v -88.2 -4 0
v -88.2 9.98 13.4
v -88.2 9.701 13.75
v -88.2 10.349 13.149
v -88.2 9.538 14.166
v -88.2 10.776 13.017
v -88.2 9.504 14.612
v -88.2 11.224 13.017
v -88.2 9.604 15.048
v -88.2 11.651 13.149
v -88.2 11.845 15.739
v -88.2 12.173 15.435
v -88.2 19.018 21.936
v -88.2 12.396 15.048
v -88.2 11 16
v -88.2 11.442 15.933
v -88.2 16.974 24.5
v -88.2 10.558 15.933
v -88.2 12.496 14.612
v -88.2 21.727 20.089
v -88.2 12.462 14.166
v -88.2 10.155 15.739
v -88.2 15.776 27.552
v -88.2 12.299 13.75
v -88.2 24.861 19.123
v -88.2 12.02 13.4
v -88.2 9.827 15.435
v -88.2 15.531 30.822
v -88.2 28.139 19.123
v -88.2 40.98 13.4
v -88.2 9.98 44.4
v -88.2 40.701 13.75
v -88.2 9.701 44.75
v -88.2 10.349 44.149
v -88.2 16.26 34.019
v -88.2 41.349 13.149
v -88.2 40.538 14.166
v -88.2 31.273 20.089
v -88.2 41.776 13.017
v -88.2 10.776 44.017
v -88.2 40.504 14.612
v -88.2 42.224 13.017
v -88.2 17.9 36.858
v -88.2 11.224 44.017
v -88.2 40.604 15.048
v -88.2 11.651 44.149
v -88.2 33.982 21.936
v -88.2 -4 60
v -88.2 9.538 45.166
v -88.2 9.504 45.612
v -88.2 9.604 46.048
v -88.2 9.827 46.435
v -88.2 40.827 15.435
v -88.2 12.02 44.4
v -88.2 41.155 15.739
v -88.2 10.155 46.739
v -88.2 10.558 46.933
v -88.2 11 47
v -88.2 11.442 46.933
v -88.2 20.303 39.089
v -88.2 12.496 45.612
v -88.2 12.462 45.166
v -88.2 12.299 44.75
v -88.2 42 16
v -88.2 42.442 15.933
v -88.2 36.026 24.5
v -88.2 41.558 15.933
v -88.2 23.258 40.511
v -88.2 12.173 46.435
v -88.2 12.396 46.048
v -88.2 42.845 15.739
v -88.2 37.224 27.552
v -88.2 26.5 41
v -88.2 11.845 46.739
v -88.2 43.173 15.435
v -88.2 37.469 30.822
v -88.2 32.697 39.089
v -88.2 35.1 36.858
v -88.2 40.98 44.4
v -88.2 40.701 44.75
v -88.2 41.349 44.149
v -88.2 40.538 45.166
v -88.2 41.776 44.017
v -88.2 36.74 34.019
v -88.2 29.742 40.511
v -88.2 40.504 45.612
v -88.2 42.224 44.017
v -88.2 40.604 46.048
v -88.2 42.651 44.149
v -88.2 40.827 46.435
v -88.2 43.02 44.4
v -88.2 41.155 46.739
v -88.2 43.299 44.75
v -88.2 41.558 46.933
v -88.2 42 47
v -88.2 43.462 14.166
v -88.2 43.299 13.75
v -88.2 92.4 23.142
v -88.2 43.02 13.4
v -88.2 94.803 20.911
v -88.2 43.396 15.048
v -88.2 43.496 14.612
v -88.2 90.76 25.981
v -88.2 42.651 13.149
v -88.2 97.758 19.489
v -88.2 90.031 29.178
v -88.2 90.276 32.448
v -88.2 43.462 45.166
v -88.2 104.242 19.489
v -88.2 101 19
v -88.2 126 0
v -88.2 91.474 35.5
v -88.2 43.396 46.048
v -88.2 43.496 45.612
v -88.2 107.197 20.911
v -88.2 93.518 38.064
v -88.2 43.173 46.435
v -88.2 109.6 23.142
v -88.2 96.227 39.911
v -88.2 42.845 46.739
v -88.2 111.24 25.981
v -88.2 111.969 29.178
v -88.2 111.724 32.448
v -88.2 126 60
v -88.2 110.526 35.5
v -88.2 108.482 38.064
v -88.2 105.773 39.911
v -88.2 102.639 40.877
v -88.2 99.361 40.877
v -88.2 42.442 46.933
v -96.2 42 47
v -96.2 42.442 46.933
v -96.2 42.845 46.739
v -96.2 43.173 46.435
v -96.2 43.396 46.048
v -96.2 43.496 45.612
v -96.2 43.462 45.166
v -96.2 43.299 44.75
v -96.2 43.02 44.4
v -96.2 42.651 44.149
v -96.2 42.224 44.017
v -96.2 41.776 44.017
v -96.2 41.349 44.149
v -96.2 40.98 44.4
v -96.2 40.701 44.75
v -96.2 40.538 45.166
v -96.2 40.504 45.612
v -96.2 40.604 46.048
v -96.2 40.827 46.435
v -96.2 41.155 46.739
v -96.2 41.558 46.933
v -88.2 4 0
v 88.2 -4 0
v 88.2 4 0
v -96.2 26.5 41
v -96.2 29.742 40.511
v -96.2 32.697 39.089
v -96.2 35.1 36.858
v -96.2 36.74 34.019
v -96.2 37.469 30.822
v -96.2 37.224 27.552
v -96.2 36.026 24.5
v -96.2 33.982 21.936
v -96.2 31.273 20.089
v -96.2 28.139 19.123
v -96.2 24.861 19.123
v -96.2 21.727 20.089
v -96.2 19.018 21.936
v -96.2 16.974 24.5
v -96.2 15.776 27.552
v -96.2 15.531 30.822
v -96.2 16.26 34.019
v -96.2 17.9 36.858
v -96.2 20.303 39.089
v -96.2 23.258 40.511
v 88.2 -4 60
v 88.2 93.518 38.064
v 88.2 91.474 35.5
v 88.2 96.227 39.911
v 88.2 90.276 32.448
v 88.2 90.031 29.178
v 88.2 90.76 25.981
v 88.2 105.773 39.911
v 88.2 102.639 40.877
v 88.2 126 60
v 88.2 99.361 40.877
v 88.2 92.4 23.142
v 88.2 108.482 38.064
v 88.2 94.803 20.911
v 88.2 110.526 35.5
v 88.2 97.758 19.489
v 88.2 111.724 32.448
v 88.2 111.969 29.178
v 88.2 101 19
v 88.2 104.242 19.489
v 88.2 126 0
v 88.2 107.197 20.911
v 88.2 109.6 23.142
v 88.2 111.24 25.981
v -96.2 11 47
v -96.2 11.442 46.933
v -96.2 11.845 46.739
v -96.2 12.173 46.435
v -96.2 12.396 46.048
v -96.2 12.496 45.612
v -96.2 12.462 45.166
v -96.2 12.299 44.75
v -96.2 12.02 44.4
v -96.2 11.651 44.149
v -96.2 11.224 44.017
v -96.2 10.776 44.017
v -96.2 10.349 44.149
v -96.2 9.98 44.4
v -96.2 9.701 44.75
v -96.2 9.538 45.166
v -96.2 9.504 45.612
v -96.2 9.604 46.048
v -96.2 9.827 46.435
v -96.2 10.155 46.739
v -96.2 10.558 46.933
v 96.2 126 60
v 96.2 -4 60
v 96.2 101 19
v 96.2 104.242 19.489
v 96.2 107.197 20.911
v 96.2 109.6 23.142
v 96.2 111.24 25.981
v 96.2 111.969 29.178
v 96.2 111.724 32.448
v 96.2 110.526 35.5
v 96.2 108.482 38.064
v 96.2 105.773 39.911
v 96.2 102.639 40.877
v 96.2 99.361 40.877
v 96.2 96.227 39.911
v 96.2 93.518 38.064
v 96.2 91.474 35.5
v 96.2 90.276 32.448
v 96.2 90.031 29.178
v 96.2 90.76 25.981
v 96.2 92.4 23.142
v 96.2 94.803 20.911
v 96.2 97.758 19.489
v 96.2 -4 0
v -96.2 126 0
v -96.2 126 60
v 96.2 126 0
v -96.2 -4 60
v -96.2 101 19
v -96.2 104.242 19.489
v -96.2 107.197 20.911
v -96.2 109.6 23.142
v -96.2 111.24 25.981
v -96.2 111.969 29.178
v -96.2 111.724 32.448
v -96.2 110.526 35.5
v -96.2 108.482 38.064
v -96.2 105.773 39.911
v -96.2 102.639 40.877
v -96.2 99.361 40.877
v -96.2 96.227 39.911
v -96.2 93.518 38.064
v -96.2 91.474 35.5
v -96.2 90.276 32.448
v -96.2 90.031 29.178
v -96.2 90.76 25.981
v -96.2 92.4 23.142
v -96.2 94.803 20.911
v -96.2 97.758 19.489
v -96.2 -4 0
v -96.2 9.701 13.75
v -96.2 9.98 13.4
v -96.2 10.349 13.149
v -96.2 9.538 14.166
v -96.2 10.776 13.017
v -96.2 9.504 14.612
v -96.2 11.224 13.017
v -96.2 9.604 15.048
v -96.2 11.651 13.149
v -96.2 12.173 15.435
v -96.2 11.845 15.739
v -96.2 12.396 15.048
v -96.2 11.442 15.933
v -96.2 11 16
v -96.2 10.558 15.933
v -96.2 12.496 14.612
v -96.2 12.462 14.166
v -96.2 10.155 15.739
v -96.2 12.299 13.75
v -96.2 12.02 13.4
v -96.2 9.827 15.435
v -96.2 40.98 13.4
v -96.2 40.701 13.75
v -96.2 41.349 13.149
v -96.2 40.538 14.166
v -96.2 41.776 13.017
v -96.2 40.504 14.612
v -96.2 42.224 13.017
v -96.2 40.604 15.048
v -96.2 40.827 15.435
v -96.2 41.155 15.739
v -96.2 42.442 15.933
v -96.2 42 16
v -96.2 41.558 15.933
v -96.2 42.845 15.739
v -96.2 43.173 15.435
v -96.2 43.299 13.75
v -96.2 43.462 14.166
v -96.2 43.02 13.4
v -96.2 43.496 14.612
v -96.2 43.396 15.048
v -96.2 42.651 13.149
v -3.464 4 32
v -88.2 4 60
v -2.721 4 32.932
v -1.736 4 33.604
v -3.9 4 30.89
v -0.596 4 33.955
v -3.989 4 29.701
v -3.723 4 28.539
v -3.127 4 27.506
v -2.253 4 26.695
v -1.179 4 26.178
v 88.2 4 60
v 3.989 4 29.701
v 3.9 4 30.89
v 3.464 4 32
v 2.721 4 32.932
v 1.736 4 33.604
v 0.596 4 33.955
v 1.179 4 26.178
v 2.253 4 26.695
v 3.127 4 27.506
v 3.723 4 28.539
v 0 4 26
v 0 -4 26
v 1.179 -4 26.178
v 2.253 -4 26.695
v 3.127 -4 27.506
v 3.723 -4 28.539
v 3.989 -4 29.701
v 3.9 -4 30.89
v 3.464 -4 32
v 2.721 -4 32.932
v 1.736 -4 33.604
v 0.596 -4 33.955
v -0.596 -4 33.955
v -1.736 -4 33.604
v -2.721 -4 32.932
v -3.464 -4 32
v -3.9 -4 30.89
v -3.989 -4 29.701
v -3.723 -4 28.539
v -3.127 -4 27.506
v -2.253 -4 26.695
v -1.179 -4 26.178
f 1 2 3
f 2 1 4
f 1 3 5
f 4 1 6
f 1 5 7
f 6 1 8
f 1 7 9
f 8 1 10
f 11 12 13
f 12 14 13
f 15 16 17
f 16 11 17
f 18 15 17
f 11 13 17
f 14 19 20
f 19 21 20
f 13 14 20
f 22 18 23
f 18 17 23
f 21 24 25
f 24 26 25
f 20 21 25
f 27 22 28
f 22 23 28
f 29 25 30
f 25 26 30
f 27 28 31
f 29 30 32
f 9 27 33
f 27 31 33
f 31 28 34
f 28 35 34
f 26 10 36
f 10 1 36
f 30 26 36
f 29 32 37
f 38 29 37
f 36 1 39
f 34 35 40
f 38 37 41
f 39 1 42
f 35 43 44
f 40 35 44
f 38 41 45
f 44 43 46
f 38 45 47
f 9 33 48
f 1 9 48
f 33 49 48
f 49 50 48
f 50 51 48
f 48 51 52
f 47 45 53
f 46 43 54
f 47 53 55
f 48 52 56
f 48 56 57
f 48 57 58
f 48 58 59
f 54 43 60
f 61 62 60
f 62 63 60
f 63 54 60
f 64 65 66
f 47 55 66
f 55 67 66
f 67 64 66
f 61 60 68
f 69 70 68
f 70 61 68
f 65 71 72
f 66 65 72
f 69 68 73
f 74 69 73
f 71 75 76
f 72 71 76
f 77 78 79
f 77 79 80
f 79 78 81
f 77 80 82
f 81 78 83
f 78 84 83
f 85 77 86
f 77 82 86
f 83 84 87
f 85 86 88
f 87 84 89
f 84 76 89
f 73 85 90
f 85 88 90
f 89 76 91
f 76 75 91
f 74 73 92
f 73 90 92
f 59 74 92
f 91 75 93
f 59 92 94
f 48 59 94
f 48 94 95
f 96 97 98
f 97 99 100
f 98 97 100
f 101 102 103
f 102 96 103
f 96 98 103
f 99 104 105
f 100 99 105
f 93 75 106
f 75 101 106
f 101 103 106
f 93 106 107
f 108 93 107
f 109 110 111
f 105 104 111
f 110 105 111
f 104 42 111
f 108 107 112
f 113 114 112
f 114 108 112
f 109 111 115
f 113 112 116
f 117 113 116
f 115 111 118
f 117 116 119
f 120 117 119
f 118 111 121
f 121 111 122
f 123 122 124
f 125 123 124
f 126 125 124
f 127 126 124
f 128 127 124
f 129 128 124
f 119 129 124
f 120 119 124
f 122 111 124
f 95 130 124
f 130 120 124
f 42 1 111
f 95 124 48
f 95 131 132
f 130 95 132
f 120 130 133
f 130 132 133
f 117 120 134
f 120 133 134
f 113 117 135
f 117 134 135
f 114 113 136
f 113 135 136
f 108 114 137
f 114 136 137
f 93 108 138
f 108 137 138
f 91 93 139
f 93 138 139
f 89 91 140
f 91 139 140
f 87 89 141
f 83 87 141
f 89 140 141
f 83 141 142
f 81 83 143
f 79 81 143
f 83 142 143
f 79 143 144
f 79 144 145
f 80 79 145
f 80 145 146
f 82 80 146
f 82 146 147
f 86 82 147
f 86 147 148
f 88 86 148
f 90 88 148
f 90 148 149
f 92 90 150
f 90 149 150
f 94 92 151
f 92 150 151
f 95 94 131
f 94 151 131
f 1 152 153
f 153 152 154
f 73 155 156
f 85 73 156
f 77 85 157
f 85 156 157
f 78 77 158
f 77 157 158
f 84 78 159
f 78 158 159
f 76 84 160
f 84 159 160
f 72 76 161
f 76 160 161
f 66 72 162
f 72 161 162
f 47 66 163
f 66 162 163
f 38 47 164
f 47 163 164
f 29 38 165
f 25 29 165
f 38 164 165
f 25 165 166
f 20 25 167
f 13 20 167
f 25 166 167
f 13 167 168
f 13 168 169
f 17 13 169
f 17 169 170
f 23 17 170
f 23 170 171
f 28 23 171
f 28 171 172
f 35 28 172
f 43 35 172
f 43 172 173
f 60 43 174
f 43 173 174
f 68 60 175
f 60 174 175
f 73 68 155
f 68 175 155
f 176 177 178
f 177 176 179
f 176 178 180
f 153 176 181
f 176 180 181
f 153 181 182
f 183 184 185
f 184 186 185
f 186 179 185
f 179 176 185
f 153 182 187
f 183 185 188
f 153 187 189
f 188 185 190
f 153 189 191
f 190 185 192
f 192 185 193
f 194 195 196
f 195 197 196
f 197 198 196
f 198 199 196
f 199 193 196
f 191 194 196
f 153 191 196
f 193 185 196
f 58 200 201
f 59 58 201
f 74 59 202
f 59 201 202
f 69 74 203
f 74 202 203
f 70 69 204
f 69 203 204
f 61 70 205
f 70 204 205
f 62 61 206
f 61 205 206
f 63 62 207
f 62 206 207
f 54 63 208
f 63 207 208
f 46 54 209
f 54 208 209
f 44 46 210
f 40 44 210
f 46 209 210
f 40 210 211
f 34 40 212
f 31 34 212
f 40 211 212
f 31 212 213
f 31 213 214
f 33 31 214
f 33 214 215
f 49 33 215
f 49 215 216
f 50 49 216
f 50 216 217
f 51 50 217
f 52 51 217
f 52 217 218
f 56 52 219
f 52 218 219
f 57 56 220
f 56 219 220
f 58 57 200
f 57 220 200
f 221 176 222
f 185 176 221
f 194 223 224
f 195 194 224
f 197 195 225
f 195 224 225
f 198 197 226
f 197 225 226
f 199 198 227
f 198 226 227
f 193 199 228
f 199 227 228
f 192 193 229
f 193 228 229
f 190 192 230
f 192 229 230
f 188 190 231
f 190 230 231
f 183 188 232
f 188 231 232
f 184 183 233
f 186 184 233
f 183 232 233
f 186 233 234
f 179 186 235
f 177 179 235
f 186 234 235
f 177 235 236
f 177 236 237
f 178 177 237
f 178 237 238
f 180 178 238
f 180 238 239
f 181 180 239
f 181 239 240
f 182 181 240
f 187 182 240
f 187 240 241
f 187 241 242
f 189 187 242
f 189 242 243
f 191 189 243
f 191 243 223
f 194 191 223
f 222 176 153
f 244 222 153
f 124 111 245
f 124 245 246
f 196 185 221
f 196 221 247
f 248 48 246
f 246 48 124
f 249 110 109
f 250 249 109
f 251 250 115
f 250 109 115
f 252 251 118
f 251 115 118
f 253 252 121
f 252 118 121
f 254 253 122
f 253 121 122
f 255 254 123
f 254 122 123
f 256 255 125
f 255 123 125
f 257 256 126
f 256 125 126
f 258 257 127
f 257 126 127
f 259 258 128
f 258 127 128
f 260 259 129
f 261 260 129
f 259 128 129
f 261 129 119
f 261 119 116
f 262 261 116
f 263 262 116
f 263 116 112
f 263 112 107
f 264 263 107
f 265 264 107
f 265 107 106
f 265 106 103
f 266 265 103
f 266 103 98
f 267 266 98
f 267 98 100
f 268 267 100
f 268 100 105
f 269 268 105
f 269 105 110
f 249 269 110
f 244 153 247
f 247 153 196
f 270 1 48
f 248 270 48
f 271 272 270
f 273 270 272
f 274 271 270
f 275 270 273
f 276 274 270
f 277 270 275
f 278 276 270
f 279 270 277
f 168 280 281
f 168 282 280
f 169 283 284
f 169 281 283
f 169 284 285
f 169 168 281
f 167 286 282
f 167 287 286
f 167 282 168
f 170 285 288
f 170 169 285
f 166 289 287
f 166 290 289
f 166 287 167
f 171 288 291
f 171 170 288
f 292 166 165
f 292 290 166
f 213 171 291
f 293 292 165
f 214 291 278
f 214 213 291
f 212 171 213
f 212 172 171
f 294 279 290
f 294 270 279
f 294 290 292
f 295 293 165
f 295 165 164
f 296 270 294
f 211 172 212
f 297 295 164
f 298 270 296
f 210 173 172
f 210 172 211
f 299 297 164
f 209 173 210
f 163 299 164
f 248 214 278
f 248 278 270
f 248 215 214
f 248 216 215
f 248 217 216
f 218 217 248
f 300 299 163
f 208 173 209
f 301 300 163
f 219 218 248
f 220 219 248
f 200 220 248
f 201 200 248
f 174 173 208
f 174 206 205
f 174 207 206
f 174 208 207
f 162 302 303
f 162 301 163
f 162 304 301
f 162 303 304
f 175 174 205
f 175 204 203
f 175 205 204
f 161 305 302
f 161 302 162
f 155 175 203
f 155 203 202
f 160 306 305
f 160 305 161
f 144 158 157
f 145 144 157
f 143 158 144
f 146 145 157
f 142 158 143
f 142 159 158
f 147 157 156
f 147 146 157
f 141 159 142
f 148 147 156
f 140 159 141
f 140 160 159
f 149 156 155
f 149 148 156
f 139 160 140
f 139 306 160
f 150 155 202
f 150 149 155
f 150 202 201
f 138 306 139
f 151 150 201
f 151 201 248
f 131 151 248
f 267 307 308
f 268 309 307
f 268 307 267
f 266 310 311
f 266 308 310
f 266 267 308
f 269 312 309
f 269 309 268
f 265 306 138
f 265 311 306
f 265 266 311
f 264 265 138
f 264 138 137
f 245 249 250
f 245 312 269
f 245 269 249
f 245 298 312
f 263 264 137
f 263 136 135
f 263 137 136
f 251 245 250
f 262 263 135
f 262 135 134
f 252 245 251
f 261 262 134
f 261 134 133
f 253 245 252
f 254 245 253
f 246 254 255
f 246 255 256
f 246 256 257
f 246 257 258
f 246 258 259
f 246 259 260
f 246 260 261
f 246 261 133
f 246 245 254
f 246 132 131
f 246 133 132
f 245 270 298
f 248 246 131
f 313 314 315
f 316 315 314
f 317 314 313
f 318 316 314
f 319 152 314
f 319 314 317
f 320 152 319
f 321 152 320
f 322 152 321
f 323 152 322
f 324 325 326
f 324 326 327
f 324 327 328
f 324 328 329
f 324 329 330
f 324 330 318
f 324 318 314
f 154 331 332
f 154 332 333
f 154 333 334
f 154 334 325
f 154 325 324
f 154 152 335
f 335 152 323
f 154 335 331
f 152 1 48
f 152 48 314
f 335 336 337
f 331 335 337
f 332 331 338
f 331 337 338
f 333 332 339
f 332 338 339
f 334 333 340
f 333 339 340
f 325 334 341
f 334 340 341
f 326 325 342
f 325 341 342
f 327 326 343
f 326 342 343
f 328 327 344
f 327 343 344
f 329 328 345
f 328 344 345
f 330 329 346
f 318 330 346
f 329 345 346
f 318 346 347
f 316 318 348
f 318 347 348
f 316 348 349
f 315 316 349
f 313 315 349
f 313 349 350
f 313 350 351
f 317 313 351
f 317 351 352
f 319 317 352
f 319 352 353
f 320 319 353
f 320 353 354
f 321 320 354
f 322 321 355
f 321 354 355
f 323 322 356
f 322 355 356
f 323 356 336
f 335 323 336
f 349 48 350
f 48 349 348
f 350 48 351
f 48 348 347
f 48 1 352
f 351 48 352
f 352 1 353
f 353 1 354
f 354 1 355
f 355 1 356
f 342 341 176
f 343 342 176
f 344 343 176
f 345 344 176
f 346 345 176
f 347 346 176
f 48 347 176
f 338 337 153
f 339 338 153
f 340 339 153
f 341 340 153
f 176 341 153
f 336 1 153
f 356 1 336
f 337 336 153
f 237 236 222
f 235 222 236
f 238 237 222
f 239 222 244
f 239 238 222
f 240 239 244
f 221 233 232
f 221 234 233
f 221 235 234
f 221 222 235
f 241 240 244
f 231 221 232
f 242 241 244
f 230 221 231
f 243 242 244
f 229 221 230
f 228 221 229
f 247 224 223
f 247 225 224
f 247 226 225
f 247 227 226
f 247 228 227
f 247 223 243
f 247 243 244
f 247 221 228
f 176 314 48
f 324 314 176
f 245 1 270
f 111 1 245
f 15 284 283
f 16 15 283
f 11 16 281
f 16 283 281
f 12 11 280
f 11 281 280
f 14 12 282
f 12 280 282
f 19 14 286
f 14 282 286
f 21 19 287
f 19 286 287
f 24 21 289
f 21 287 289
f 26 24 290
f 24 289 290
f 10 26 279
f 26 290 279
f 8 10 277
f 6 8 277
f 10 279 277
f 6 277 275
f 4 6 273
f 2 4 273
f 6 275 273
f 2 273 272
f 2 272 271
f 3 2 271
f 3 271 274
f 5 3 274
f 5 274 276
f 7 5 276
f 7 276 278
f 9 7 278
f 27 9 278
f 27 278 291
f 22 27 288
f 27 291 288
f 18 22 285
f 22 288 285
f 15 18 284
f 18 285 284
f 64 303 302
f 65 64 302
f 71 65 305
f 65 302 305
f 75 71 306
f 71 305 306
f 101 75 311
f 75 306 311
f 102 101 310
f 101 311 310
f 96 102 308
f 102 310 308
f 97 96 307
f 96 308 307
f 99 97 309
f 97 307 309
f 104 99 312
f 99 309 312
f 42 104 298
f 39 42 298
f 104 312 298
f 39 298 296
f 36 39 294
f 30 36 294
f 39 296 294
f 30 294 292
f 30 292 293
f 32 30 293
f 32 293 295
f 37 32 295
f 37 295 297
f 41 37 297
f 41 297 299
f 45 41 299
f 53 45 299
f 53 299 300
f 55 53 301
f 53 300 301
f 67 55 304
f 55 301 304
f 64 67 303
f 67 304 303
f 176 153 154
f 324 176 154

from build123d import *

# Parameters (mm, degrees)
SKETCH1_W           = 176.4
SKETCH1_H           = 8
BOSS_EXTRUDE1_DEPTH = 60
SKETCH2_W           = 60
SKETCH2_H           = 130
BOSS_EXTRUDE2_DEPTH = 8
SKETCH3_W           = 60
SKETCH3_H           = 130
BOSS_EXTRUDE3_DEPTH = 8
SKETCH4_R           = 11
CUT_EXTRUDE1_DEPTH  = 238.684160179
SKETCH5_R           = 4
CUT_EXTRUDE2_DEPTH  = 8
SKETCH6_R           = 1.5
SKETCH6_R_2         = 11
CUT_EXTRUDE3_DEPTH  = 8


with BuildPart() as part:
    # Sketch1 → Boss-Extrude1 (new body)
    with BuildSketch(Plane.XY):
        Rectangle(SKETCH1_W, SKETCH1_H)
    extrude(amount=BOSS_EXTRUDE1_DEPTH)

    # Sketch5 → Cut-Extrude2 (cut)
    with BuildSketch(Plane.XZ.offset(4)):
        with Locations(Location((0, 30, 0), (0, 0, 270))):
            Circle(SKETCH5_R)
    extrude(amount=-CUT_EXTRUDE2_DEPTH, mode=Mode.SUBTRACT)


with BuildPart() as body_2:
    # Sketch2 → Boss-Extrude2 (new body)
    with BuildSketch(Plane(origin=(88.2, 0, 0), x_dir=(0, 0, -1), z_dir=(1, 0, 0))):
        with Locations((-30, 61)):
            Rectangle(SKETCH2_W, SKETCH2_H)
    extrude(amount=BOSS_EXTRUDE2_DEPTH)


with BuildPart() as body_3:
    # Sketch3 → Boss-Extrude3 (new body)
    with BuildSketch(Plane.ZY.offset(88.2)):
        with Locations((30, 61)):
            Rectangle(SKETCH3_W, SKETCH3_H)
    extrude(amount=BOSS_EXTRUDE3_DEPTH)


with BuildPart() as cut_extrude1_tool:
    # Sketch4 → Cut-Extrude1 (new, through all)
    with BuildSketch(Plane(origin=(96.2, 0, 0), x_dir=(0, 0, -1), z_dir=(1, 0, 0))):
        with Locations((-30, 101)):
            Circle(SKETCH4_R)
    extrude(amount=-CUT_EXTRUDE1_DEPTH)


with BuildPart() as body_2_1:
    add(body_2.part)

    # Cut-Extrude1: cut by cut_extrude1_tool
    add(cut_extrude1_tool.part, mode=Mode.SUBTRACT)


with BuildPart() as body_3_1:
    add(body_3.part)

    # Cut-Extrude1: cut by cut_extrude1_tool
    add(cut_extrude1_tool.part, mode=Mode.SUBTRACT)

    # Sketch6 → Cut-Extrude3 (cut)
    with BuildSketch(Plane.ZY.offset(96.2)):
        with Locations((14.5, 42)):
            Circle(SKETCH6_R)
        with Locations((45.5, 42)):
            Circle(SKETCH6_R)
        with Locations((45.5, 11)):
            Circle(SKETCH6_R)
        with Locations((14.5, 11)):
            Circle(SKETCH6_R)
        with Locations((30, 26.5)):
            Circle(SKETCH6_R_2)
    extrude(amount=-CUT_EXTRUDE3_DEPTH, mode=Mode.SUBTRACT)


solid = Compound([part.part, body_2_1.part, body_3_1.part])
